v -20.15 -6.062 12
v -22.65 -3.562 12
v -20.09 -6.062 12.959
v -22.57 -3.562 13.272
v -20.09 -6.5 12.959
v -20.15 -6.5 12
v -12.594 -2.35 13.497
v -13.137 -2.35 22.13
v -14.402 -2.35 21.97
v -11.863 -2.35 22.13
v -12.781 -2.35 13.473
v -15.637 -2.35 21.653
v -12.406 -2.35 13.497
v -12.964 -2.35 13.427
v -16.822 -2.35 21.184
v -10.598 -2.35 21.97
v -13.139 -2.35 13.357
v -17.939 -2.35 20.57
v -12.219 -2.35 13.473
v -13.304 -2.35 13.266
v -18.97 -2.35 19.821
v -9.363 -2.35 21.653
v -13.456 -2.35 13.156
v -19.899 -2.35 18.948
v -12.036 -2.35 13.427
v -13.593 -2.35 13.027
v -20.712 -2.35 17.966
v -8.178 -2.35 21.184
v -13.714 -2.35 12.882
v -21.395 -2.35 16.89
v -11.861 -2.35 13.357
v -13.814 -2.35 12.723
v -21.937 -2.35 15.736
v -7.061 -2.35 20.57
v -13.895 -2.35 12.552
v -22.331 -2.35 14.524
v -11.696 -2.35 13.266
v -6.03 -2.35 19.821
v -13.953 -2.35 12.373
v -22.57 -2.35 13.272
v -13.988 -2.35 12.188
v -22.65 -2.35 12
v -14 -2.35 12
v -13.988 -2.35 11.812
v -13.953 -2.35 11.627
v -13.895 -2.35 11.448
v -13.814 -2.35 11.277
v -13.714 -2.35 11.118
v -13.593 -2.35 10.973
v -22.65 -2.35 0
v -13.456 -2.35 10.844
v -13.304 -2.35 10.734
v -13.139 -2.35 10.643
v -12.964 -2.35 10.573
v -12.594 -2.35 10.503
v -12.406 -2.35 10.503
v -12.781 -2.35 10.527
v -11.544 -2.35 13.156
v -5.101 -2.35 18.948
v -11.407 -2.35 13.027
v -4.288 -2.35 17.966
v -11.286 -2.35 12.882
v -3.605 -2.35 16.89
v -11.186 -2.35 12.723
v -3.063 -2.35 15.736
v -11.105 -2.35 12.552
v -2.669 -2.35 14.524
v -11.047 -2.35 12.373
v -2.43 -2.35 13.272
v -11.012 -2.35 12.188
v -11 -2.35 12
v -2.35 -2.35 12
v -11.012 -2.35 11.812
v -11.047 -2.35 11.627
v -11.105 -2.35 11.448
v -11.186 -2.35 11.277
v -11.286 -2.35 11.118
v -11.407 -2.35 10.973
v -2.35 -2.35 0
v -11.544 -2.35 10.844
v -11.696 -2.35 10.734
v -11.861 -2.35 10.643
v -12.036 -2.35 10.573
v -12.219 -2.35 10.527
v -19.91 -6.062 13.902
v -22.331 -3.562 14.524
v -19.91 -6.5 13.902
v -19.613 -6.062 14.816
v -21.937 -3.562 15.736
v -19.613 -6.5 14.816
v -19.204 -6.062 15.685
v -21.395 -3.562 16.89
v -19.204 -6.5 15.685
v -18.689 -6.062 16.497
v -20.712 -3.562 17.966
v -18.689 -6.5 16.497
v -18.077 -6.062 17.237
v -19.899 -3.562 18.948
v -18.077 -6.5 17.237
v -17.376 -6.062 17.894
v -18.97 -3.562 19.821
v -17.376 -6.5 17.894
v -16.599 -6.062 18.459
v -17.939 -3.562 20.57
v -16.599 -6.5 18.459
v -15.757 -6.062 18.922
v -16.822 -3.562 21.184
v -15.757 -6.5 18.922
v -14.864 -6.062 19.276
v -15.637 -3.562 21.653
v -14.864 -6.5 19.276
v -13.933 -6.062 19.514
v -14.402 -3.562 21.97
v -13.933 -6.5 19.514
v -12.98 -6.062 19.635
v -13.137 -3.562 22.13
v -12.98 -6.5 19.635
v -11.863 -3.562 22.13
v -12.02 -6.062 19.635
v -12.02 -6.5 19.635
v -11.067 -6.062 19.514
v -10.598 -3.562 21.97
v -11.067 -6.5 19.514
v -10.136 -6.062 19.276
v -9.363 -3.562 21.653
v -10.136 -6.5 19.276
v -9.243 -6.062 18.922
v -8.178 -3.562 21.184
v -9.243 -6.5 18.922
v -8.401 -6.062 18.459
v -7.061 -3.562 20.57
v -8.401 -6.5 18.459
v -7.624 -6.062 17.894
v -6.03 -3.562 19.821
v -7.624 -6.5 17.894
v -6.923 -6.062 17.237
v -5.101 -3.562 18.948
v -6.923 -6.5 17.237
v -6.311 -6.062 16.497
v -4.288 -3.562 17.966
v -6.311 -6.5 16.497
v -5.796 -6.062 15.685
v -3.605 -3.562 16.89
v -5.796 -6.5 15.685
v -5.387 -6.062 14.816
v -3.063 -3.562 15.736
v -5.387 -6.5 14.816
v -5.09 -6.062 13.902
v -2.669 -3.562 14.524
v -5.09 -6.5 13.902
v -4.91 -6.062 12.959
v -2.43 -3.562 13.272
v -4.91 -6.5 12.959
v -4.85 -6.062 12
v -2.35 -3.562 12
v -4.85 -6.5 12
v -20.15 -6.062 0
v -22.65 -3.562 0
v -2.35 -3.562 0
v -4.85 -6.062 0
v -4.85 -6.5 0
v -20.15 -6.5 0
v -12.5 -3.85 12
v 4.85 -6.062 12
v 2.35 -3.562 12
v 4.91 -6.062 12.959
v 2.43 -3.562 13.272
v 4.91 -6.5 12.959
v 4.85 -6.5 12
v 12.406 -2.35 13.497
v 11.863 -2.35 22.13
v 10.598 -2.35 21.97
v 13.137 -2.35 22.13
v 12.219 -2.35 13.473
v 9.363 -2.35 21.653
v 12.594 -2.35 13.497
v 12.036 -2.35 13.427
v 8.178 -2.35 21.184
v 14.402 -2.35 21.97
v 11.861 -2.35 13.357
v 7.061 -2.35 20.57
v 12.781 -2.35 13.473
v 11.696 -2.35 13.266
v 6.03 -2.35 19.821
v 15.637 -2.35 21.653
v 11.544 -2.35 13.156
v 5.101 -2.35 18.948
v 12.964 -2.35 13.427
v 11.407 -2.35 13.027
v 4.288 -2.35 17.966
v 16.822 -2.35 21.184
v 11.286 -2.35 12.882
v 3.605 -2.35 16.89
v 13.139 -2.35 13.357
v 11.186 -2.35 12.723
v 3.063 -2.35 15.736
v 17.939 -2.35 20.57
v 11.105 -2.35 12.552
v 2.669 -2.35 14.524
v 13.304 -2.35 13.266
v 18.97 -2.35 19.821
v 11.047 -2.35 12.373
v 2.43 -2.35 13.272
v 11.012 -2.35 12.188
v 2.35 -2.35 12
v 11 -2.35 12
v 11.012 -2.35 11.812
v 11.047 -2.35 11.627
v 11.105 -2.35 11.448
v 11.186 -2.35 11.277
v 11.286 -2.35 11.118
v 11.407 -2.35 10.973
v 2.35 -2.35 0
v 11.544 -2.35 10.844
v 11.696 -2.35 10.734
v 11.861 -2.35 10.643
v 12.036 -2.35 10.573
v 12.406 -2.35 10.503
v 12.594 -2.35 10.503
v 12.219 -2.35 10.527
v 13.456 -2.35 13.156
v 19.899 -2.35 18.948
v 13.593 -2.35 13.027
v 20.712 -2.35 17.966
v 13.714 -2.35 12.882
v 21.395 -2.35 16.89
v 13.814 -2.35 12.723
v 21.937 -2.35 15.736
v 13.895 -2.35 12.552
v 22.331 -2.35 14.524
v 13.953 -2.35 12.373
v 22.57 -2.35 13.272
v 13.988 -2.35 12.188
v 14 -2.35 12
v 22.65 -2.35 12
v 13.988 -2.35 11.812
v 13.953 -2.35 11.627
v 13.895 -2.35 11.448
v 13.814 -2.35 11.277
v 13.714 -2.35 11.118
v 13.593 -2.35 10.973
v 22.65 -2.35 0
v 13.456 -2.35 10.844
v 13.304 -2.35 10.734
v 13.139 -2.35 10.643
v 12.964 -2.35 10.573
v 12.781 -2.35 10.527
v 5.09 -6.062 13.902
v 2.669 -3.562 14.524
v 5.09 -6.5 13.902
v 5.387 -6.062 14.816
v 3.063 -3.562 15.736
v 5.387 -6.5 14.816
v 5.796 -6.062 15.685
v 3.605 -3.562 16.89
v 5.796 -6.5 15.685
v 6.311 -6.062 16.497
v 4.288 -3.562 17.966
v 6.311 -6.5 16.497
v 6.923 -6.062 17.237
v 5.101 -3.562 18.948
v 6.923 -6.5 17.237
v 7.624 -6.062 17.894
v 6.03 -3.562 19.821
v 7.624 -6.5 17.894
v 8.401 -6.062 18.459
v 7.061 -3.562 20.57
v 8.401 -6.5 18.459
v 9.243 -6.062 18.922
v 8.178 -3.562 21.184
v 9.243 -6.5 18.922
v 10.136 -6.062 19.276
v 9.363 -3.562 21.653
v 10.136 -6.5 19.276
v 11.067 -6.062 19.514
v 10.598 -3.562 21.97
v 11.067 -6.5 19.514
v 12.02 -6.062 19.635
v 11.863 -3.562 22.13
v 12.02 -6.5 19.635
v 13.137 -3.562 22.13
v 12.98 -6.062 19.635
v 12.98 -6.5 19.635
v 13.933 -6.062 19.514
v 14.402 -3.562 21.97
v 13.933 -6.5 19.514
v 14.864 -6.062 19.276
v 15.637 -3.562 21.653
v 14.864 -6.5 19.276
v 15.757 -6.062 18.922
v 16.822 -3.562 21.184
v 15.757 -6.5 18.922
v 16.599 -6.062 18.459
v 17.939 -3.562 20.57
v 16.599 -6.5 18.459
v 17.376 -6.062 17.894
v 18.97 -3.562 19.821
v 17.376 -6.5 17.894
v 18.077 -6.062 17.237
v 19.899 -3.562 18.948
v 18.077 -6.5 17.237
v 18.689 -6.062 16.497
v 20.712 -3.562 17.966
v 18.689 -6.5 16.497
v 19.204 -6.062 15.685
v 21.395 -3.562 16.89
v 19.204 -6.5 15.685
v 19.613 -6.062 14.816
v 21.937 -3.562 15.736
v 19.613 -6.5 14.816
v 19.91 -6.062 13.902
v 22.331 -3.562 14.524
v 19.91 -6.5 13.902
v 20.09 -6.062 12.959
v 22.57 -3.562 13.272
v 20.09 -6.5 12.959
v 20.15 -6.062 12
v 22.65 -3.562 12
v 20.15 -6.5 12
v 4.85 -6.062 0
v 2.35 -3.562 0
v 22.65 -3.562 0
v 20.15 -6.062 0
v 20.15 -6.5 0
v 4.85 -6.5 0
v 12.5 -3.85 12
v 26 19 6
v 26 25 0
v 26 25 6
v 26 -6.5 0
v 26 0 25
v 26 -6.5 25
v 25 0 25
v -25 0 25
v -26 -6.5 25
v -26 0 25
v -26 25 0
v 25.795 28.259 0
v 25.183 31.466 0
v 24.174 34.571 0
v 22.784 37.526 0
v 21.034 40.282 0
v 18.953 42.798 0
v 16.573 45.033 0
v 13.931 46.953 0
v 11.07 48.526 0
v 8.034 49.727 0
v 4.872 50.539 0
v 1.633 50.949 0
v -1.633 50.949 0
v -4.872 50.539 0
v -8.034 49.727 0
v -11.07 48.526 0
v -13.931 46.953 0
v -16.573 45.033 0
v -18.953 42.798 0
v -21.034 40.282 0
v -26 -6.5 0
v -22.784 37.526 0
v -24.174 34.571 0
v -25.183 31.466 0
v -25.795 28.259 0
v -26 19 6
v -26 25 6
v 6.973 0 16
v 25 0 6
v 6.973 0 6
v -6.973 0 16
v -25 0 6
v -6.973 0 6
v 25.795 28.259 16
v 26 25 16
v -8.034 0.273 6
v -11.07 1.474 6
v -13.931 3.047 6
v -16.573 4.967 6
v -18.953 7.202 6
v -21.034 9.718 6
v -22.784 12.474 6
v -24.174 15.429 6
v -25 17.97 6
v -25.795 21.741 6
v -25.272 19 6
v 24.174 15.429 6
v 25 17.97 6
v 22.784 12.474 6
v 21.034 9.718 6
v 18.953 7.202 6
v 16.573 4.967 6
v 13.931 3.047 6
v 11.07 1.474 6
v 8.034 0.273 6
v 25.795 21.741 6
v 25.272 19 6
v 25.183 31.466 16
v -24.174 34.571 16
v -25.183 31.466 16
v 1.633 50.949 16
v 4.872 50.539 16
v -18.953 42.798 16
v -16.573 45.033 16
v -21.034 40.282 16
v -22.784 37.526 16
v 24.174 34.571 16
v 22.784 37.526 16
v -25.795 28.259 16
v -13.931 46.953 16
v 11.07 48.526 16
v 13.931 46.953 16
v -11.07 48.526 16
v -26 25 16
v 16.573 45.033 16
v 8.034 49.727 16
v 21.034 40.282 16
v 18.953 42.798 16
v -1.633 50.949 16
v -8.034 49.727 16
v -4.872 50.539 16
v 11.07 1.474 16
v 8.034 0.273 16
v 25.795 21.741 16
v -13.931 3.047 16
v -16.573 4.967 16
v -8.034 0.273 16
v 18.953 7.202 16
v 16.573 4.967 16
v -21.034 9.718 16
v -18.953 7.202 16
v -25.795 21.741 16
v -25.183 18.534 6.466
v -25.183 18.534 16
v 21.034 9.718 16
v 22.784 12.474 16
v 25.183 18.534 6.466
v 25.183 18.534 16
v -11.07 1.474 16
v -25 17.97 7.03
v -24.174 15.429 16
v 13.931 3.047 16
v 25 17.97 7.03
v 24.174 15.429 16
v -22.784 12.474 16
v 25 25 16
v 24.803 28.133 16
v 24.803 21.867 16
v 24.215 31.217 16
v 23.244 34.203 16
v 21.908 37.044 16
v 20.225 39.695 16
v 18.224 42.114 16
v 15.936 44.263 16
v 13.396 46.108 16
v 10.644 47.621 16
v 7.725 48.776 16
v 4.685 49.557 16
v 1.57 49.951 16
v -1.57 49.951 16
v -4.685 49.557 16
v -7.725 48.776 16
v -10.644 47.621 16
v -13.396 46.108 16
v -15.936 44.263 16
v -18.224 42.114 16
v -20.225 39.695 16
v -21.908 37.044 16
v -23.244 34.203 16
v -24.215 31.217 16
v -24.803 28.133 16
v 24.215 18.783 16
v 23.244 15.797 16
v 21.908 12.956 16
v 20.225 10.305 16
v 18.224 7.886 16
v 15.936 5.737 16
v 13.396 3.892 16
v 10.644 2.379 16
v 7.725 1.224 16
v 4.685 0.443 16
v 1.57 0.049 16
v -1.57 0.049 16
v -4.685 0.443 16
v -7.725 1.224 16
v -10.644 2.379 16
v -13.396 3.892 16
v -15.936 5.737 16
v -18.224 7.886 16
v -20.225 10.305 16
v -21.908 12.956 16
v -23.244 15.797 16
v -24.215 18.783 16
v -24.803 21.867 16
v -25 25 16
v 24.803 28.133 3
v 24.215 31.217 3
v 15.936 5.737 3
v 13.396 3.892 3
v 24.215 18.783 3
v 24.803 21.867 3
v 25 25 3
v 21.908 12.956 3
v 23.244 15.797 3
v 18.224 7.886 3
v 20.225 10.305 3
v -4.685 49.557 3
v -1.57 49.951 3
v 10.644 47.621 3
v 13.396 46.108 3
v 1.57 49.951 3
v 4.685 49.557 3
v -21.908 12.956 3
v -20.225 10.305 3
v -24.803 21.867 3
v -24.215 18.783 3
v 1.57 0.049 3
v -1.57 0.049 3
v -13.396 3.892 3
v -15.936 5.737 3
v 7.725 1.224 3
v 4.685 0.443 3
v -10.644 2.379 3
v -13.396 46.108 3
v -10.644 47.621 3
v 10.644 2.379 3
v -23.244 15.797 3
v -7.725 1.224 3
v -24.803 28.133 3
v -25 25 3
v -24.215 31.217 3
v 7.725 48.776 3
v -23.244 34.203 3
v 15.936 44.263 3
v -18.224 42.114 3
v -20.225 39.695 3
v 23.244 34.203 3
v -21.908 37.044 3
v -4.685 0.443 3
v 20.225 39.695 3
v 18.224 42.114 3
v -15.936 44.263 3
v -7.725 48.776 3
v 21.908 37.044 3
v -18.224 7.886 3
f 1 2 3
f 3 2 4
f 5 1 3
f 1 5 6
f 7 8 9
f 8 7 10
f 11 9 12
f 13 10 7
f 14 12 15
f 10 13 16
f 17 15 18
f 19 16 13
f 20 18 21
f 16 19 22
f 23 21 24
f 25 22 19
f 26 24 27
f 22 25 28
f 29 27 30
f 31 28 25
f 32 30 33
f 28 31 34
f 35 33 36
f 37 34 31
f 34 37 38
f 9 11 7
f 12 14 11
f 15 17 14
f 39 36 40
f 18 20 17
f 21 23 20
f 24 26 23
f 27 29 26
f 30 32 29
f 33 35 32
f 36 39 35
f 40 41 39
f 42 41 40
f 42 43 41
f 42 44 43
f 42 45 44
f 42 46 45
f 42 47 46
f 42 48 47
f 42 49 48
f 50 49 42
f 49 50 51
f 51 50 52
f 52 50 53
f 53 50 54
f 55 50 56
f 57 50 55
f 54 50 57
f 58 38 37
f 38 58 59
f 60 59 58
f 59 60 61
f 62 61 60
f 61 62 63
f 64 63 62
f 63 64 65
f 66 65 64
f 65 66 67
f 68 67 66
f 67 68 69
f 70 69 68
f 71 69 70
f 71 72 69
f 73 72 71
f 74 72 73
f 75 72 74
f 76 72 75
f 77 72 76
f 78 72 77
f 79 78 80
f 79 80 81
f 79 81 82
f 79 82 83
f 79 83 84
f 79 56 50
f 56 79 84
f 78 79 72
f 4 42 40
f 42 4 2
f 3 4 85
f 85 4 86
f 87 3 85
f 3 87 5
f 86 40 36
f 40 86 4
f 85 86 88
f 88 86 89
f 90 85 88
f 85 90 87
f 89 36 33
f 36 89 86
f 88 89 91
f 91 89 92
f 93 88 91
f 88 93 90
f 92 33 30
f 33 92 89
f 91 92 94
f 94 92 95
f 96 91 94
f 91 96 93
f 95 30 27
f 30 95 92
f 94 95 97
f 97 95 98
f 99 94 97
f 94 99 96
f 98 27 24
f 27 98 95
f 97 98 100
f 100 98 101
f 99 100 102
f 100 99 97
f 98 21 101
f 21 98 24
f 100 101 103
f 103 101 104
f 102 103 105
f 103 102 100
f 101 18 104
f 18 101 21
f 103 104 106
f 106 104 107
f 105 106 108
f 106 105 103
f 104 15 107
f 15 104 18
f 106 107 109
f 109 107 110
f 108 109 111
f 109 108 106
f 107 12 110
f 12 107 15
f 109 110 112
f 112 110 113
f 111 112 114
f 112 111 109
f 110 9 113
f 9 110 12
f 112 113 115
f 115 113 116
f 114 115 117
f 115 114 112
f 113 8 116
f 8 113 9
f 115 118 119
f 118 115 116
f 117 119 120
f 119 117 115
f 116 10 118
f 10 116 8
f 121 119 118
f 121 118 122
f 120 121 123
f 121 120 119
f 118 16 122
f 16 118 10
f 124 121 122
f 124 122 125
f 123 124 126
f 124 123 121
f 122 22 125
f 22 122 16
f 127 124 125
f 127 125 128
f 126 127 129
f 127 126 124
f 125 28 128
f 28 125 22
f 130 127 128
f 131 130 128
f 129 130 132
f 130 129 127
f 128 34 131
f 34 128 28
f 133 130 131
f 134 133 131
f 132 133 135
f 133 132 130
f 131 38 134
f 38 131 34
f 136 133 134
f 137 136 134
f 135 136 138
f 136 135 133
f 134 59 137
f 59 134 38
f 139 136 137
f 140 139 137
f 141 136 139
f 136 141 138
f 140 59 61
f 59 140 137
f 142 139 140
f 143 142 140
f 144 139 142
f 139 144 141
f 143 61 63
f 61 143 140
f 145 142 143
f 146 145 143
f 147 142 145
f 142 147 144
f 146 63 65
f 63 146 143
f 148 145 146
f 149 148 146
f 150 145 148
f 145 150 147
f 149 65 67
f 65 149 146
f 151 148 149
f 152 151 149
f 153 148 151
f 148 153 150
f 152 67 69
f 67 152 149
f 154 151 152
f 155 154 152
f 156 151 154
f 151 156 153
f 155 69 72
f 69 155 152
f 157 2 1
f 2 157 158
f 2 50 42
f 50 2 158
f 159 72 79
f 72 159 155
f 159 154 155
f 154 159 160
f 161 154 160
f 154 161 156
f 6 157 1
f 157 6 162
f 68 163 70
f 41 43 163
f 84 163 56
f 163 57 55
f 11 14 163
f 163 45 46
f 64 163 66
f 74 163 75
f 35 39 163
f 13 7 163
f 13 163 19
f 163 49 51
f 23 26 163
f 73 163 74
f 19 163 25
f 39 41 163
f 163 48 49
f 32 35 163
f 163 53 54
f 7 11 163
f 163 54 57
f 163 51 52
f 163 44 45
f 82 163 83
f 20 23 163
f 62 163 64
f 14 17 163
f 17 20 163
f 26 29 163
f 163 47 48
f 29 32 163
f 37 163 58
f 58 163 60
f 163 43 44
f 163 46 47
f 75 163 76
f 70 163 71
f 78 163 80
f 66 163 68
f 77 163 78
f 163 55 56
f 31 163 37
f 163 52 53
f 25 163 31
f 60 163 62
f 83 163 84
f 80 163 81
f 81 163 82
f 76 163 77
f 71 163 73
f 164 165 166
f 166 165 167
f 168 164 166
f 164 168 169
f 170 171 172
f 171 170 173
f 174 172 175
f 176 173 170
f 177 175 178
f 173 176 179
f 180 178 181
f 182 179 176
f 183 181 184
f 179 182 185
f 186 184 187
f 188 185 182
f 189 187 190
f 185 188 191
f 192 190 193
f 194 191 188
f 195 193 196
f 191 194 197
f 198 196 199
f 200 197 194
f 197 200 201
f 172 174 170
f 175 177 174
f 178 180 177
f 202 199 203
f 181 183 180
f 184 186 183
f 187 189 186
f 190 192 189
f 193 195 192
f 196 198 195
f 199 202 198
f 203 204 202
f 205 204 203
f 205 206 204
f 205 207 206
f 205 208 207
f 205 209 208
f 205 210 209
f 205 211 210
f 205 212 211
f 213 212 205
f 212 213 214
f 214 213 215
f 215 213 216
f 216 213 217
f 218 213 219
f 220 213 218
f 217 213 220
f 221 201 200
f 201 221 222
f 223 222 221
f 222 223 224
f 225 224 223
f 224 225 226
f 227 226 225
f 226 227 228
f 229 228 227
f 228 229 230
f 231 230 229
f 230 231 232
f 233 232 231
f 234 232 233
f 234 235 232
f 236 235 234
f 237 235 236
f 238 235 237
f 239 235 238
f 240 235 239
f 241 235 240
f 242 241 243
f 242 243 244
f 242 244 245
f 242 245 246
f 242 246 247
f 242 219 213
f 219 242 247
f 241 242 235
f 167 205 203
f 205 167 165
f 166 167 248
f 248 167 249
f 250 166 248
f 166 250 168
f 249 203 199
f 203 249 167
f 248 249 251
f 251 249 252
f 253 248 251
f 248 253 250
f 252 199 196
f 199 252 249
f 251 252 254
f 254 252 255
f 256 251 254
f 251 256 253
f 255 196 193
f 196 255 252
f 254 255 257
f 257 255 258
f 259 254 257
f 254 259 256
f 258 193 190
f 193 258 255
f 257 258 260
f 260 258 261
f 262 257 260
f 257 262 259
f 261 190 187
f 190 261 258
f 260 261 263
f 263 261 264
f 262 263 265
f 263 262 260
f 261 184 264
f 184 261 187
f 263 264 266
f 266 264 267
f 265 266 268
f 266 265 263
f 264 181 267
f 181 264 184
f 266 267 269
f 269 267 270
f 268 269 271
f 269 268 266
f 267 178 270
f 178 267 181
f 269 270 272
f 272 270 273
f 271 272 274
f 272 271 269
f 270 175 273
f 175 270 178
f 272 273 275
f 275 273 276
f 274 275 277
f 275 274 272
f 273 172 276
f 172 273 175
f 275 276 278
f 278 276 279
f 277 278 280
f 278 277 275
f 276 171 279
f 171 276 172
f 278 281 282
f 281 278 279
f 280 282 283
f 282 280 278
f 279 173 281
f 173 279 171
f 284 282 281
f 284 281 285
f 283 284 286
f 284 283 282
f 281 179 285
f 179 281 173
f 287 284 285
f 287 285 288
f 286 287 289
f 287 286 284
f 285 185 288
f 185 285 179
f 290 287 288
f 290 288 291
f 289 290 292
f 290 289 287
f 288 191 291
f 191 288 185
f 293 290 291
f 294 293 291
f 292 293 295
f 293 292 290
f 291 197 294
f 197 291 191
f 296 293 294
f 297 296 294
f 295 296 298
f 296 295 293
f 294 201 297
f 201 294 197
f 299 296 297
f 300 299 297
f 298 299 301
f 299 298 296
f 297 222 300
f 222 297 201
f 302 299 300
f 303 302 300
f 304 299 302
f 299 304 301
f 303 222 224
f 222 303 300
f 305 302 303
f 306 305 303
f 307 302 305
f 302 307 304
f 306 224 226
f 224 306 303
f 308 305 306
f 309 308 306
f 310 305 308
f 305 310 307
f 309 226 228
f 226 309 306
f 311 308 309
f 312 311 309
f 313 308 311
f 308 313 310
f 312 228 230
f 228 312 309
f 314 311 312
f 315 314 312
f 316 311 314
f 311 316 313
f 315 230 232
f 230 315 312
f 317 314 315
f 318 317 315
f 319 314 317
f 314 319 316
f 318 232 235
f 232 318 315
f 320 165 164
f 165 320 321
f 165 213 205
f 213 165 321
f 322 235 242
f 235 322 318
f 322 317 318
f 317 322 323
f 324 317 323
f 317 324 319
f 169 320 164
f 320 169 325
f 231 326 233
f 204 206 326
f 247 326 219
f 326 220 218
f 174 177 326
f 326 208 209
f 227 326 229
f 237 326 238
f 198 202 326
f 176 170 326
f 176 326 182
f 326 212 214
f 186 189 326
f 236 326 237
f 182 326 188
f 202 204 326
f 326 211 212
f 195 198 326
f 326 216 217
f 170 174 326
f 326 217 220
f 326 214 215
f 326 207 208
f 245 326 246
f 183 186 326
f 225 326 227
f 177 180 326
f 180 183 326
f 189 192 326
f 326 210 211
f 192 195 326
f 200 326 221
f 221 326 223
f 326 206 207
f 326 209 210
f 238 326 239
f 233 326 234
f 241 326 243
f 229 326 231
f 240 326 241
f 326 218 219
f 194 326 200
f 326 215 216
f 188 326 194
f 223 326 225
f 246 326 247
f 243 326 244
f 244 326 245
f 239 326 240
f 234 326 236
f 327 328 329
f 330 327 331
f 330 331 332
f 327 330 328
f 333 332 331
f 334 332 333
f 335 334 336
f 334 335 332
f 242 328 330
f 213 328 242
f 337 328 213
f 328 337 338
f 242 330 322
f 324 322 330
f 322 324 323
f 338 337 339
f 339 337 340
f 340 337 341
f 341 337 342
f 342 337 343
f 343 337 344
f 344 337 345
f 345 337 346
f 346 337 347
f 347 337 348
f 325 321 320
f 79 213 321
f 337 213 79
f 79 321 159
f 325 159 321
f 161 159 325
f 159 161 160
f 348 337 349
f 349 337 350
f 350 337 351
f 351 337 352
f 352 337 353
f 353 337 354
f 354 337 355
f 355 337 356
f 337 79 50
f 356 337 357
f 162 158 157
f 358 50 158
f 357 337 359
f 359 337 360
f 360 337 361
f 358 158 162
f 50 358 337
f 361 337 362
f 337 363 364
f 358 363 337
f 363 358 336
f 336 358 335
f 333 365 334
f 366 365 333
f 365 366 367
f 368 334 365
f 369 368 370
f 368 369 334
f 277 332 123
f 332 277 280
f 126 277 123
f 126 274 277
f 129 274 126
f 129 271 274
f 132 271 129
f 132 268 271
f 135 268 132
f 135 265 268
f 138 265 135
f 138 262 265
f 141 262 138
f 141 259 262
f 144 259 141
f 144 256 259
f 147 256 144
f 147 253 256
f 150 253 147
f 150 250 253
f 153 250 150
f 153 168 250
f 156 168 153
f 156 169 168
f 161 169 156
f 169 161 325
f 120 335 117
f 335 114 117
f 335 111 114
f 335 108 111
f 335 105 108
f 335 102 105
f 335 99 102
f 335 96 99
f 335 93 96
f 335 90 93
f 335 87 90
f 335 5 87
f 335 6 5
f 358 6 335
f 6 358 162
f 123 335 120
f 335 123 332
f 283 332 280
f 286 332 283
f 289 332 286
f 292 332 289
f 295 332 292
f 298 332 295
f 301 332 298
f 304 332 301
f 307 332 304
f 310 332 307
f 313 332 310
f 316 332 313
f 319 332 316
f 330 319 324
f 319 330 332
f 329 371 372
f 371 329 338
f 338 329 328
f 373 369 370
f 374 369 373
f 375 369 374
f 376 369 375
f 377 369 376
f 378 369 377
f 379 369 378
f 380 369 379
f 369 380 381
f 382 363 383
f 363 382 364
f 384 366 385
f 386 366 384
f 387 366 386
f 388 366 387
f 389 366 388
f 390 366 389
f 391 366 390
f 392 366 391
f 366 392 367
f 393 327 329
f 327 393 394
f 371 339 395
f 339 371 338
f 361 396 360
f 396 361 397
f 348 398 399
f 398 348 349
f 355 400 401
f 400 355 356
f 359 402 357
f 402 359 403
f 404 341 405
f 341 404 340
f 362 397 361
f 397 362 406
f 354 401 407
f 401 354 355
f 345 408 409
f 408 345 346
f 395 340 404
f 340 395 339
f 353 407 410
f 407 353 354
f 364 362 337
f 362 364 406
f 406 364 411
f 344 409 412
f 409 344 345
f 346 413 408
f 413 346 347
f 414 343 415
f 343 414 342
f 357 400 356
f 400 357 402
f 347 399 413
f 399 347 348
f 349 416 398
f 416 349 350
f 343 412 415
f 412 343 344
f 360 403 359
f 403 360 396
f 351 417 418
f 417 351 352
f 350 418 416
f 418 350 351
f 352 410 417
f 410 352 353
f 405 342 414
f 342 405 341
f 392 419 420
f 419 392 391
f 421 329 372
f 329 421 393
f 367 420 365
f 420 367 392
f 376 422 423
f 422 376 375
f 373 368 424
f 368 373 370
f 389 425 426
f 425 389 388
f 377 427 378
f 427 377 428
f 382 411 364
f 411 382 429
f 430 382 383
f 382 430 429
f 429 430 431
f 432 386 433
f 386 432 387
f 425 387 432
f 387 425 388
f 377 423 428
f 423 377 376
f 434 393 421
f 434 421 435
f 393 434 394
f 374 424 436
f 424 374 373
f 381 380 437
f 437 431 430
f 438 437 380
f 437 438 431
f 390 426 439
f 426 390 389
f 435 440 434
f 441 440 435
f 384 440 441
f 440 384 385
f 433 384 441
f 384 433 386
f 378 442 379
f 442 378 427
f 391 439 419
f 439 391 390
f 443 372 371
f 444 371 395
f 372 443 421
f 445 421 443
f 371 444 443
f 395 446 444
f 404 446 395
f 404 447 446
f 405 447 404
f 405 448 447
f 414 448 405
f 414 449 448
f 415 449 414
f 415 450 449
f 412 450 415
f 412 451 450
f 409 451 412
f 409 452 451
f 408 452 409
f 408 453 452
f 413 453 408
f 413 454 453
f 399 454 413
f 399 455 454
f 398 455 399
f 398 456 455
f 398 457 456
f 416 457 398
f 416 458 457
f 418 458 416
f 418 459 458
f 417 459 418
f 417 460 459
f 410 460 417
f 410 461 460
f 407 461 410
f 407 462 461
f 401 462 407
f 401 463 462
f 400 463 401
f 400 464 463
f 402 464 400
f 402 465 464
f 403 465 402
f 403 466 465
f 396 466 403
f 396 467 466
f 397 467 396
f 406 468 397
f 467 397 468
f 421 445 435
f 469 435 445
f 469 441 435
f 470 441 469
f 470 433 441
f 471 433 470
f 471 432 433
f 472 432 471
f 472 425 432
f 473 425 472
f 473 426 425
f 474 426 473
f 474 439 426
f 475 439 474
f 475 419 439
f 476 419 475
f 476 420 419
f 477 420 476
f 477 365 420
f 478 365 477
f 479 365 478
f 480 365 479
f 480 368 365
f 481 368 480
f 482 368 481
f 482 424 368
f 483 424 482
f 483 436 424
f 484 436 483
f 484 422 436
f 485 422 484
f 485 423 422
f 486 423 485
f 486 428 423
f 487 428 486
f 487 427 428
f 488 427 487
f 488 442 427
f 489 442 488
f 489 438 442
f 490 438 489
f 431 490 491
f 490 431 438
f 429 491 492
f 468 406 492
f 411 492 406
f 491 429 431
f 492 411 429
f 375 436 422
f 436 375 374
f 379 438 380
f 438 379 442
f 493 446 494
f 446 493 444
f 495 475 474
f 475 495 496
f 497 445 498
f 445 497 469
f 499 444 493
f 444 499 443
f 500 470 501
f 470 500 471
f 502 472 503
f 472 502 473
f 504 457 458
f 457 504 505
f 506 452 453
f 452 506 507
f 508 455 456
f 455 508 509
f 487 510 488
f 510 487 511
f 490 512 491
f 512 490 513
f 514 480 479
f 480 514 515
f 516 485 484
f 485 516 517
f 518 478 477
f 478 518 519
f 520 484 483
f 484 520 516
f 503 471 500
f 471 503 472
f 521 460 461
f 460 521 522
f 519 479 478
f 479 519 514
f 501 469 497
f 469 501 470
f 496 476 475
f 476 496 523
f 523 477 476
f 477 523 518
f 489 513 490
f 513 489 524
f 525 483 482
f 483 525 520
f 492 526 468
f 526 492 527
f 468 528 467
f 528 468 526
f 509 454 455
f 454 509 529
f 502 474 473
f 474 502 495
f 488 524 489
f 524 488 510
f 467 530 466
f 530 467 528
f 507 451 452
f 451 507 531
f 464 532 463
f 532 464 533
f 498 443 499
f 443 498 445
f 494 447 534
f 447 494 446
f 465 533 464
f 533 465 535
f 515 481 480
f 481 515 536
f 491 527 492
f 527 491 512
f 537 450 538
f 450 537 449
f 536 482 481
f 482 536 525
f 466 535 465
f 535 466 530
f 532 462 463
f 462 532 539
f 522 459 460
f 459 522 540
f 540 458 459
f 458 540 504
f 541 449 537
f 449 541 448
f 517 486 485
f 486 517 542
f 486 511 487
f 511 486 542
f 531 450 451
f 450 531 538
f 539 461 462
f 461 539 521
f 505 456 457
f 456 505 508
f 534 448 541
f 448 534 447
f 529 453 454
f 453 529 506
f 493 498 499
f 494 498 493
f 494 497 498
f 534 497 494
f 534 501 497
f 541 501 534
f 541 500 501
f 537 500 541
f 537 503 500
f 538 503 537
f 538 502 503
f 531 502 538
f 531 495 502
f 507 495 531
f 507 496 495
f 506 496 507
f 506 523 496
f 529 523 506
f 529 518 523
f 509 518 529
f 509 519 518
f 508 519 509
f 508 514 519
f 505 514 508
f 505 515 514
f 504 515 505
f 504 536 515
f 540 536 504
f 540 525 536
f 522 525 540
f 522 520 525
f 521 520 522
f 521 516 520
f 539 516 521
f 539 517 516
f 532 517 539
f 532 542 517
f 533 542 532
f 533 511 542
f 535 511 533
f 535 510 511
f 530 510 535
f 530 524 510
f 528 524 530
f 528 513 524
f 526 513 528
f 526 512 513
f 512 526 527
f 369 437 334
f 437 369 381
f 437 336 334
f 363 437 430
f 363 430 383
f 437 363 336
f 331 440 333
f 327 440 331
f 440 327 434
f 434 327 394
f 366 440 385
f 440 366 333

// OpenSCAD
/*Created by Andy Levesque
Credit to @David D on Printables and Jonathan at Keep Making for Multiconnect and Multiboard, respectively
Licensed Creative Commons 4.0 Attribution Non-Commercial Sharable with Attribution
*/

/*[Parameters]*/
//diameter (in mm) of the item you wish to insert (this becomes the internal diameter)
itemDiameter = 50; //0.1
//thickness (in mm) of the wall surrounding the item
rimThickness = 1;
//Thickness (in mm) of the base underneath the item you are holding
baseThickness = 3;
//Additional thickness of the area between the item holding and the backer.
shelfSupportHeight = 3;
//Additional height (in mm) of the rim protruding upward to hold the item
rimHeight = 10;
//Additional Backer Height (in mm) in case you prefer additional support for something heavy
additionalBackerHeight = 0;

/*[Slot Customization]*/
//Distance between Multiconnect slots on the back (25mm is standard for MultiBoard)
distanceBetweenSlots = 25;
//QuickRelease removes the small indent in the top of the slots that lock the part into place
slotQuickRelease = false;
//Dimple scale tweaks the size of the dimple in the slot for printers that need a larger dimple to print correctly
dimpleScale = 1; //[0.5:.05:1.5]
//Scale the size of slots in the back (1.015 scale is default for a tight fit. Increase if your finding poor fit. )
slotTolerance = 1.00; //[0.925:0.005:1.075]
//Move the slot in (positive) or out (negative)
slotDepthMicroadjustment = 0; //[-.5:0.05:.5]
//enable a slot on-ramp for easy mounting of tall items
onRampEnabled = true;
//frequency of slots for on-ramp. 1 = every slot; 2 = every 2 slots; etc.
onRampEveryXSlots = 1;


/*[Hidden]*/
totalWidth = itemDiameter + rimThickness*2;
totalHeight = max(baseThickness+shelfSupportHeight+0.25*itemDiameter,25);

//start build
translate(v = [-max(totalWidth,distanceBetweenSlots)/2,0,0]) 
    multiconnectBack(backWidth = totalWidth, backHeight = totalHeight+additionalBackerHeight, distanceBetweenSlots = distanceBetweenSlots);
    //item holder
translate(v = [-totalWidth/2,0,0]) 
union() {
    difference() {
        //itemwalls
        union() {
            hull(){
                translate(v = [totalWidth/2,itemDiameter/2,0]) 
                    //outer circle
                    linear_extrude(height = shelfSupportHeight+baseThickness) 
                            circle(r = itemDiameter/2+rimThickness, $fn=50);
                    //wide back for hull operation
                    linear_extrude(height = shelfSupportHeight+baseThickness) 
                            square(size = [totalWidth,1]);
                }
            //thin holding wall
            translate(v = [totalWidth/2,itemDiameter/2,shelfSupportHeight+baseThickness]) 
                linear_extrude(height = rimHeight) 
                    circle(r = itemDiameter/2+rimThickness, $fn=50);
        }
        //itemDiameter (i.e., delete tool)
        translate(v = [totalWidth/2,itemDiameter/2,baseThickness]) linear_extrude(height = shelfSupportHeight+rimHeight+1) circle(r = itemDiameter/2, $fn=50);
    }
    //brackets
    bracketSize = min(totalHeight-baseThickness-shelfSupportHeight, itemDiameter/2);
    translate(v = [rimThickness,0,bracketSize+baseThickness+shelfSupportHeight]) shelfBracket(bracketHeight = bracketSize, bracketDepth = bracketSize, rimThickness = rimThickness);
    translate(v = [rimThickness*2+itemDiameter,0,bracketSize+baseThickness+shelfSupportHeight]) shelfBracket(bracketHeight = bracketSize, bracketDepth = bracketSize, rimThickness = rimThickness);
}

//BEGIN MODULES
//Slotted back Module
module multiconnectBack(backWidth, backHeight, distanceBetweenSlots)
{
    //slot count calculates how many slots can fit on the back. Based on internal width for buffer. 
    //slot width needs to be at least the distance between slot for at least 1 slot to generate
    let (backWidth = max(backWidth,distanceBetweenSlots), backHeight = max(backHeight, 25),slotCount = floor(backWidth/distanceBetweenSlots), backThickness = 6.5){
        difference() {
            translate(v = [0,-backThickness,0]) cube(size = [backWidth,backThickness,backHeight]);
            //Loop through slots and center on the item
            //Note: I kept doing math until it looked right. It's possible this can be simplified.
            for (slotNum = [0:1:slotCount-1]) {
                translate(v = [distanceBetweenSlots/2+(backWidth/distanceBetweenSlots-slotCount)*distanceBetweenSlots/2+slotNum*distanceBetweenSlots,-2.35+slotDepthMicroadjustment,backHeight-13]) {
                    slotTool(backHeight);
                }
            }
        }
    }
    //Create Slot Tool
    module slotTool(totalHeight) {
        scale(v = slotTolerance)
        //slot minus optional dimple with optional on-ramp
        let (slotProfile = [[0,0],[10.15,0],[10.15,1.2121],[7.65,3.712],[7.65,5],[0,5]])
        difference() {
            union() {
                //round top
                rotate(a = [90,0,0,]) 
                    rotate_extrude($fn=50) 
                        polygon(points = slotProfile);
                //long slot
                translate(v = [0,0,0]) 
                    rotate(a = [180,0,0]) 
                    linear_extrude(height = totalHeight+1) 
                        union(){
                            polygon(points = slotProfile);
                            mirror([1,0,0])
                                polygon(points = slotProfile);
                        }
                //on-ramp
                if(onRampEnabled)
                    for(y = [1:onRampEveryXSlots:totalHeight/distanceBetweenSlots])
                        translate(v = [0,-5,-y*distanceBetweenSlots]) 
                            rotate(a = [-90,0,0]) 
                                cylinder(h = 5, r1 = 12, r2 = 10.15);
            }
            //dimple
            if (slotQuickRelease == false)
                scale(v = dimpleScale) 
                rotate(a = [90,0,0,]) 
                    rotate_extrude($fn=50) 
                        polygon(points = [[0,0],[0,1.5],[1.5,0]]);
        }
    }
}

module shelfBracket(bracketHeight, bracketDepth, rimThickness){
        rotate(a = [-90,0,90]) 
            linear_extrude(height = rimThickness) 
                polygon([[0,0],[0,bracketHeight],[bracketDepth,bracketHeight]]);
}
